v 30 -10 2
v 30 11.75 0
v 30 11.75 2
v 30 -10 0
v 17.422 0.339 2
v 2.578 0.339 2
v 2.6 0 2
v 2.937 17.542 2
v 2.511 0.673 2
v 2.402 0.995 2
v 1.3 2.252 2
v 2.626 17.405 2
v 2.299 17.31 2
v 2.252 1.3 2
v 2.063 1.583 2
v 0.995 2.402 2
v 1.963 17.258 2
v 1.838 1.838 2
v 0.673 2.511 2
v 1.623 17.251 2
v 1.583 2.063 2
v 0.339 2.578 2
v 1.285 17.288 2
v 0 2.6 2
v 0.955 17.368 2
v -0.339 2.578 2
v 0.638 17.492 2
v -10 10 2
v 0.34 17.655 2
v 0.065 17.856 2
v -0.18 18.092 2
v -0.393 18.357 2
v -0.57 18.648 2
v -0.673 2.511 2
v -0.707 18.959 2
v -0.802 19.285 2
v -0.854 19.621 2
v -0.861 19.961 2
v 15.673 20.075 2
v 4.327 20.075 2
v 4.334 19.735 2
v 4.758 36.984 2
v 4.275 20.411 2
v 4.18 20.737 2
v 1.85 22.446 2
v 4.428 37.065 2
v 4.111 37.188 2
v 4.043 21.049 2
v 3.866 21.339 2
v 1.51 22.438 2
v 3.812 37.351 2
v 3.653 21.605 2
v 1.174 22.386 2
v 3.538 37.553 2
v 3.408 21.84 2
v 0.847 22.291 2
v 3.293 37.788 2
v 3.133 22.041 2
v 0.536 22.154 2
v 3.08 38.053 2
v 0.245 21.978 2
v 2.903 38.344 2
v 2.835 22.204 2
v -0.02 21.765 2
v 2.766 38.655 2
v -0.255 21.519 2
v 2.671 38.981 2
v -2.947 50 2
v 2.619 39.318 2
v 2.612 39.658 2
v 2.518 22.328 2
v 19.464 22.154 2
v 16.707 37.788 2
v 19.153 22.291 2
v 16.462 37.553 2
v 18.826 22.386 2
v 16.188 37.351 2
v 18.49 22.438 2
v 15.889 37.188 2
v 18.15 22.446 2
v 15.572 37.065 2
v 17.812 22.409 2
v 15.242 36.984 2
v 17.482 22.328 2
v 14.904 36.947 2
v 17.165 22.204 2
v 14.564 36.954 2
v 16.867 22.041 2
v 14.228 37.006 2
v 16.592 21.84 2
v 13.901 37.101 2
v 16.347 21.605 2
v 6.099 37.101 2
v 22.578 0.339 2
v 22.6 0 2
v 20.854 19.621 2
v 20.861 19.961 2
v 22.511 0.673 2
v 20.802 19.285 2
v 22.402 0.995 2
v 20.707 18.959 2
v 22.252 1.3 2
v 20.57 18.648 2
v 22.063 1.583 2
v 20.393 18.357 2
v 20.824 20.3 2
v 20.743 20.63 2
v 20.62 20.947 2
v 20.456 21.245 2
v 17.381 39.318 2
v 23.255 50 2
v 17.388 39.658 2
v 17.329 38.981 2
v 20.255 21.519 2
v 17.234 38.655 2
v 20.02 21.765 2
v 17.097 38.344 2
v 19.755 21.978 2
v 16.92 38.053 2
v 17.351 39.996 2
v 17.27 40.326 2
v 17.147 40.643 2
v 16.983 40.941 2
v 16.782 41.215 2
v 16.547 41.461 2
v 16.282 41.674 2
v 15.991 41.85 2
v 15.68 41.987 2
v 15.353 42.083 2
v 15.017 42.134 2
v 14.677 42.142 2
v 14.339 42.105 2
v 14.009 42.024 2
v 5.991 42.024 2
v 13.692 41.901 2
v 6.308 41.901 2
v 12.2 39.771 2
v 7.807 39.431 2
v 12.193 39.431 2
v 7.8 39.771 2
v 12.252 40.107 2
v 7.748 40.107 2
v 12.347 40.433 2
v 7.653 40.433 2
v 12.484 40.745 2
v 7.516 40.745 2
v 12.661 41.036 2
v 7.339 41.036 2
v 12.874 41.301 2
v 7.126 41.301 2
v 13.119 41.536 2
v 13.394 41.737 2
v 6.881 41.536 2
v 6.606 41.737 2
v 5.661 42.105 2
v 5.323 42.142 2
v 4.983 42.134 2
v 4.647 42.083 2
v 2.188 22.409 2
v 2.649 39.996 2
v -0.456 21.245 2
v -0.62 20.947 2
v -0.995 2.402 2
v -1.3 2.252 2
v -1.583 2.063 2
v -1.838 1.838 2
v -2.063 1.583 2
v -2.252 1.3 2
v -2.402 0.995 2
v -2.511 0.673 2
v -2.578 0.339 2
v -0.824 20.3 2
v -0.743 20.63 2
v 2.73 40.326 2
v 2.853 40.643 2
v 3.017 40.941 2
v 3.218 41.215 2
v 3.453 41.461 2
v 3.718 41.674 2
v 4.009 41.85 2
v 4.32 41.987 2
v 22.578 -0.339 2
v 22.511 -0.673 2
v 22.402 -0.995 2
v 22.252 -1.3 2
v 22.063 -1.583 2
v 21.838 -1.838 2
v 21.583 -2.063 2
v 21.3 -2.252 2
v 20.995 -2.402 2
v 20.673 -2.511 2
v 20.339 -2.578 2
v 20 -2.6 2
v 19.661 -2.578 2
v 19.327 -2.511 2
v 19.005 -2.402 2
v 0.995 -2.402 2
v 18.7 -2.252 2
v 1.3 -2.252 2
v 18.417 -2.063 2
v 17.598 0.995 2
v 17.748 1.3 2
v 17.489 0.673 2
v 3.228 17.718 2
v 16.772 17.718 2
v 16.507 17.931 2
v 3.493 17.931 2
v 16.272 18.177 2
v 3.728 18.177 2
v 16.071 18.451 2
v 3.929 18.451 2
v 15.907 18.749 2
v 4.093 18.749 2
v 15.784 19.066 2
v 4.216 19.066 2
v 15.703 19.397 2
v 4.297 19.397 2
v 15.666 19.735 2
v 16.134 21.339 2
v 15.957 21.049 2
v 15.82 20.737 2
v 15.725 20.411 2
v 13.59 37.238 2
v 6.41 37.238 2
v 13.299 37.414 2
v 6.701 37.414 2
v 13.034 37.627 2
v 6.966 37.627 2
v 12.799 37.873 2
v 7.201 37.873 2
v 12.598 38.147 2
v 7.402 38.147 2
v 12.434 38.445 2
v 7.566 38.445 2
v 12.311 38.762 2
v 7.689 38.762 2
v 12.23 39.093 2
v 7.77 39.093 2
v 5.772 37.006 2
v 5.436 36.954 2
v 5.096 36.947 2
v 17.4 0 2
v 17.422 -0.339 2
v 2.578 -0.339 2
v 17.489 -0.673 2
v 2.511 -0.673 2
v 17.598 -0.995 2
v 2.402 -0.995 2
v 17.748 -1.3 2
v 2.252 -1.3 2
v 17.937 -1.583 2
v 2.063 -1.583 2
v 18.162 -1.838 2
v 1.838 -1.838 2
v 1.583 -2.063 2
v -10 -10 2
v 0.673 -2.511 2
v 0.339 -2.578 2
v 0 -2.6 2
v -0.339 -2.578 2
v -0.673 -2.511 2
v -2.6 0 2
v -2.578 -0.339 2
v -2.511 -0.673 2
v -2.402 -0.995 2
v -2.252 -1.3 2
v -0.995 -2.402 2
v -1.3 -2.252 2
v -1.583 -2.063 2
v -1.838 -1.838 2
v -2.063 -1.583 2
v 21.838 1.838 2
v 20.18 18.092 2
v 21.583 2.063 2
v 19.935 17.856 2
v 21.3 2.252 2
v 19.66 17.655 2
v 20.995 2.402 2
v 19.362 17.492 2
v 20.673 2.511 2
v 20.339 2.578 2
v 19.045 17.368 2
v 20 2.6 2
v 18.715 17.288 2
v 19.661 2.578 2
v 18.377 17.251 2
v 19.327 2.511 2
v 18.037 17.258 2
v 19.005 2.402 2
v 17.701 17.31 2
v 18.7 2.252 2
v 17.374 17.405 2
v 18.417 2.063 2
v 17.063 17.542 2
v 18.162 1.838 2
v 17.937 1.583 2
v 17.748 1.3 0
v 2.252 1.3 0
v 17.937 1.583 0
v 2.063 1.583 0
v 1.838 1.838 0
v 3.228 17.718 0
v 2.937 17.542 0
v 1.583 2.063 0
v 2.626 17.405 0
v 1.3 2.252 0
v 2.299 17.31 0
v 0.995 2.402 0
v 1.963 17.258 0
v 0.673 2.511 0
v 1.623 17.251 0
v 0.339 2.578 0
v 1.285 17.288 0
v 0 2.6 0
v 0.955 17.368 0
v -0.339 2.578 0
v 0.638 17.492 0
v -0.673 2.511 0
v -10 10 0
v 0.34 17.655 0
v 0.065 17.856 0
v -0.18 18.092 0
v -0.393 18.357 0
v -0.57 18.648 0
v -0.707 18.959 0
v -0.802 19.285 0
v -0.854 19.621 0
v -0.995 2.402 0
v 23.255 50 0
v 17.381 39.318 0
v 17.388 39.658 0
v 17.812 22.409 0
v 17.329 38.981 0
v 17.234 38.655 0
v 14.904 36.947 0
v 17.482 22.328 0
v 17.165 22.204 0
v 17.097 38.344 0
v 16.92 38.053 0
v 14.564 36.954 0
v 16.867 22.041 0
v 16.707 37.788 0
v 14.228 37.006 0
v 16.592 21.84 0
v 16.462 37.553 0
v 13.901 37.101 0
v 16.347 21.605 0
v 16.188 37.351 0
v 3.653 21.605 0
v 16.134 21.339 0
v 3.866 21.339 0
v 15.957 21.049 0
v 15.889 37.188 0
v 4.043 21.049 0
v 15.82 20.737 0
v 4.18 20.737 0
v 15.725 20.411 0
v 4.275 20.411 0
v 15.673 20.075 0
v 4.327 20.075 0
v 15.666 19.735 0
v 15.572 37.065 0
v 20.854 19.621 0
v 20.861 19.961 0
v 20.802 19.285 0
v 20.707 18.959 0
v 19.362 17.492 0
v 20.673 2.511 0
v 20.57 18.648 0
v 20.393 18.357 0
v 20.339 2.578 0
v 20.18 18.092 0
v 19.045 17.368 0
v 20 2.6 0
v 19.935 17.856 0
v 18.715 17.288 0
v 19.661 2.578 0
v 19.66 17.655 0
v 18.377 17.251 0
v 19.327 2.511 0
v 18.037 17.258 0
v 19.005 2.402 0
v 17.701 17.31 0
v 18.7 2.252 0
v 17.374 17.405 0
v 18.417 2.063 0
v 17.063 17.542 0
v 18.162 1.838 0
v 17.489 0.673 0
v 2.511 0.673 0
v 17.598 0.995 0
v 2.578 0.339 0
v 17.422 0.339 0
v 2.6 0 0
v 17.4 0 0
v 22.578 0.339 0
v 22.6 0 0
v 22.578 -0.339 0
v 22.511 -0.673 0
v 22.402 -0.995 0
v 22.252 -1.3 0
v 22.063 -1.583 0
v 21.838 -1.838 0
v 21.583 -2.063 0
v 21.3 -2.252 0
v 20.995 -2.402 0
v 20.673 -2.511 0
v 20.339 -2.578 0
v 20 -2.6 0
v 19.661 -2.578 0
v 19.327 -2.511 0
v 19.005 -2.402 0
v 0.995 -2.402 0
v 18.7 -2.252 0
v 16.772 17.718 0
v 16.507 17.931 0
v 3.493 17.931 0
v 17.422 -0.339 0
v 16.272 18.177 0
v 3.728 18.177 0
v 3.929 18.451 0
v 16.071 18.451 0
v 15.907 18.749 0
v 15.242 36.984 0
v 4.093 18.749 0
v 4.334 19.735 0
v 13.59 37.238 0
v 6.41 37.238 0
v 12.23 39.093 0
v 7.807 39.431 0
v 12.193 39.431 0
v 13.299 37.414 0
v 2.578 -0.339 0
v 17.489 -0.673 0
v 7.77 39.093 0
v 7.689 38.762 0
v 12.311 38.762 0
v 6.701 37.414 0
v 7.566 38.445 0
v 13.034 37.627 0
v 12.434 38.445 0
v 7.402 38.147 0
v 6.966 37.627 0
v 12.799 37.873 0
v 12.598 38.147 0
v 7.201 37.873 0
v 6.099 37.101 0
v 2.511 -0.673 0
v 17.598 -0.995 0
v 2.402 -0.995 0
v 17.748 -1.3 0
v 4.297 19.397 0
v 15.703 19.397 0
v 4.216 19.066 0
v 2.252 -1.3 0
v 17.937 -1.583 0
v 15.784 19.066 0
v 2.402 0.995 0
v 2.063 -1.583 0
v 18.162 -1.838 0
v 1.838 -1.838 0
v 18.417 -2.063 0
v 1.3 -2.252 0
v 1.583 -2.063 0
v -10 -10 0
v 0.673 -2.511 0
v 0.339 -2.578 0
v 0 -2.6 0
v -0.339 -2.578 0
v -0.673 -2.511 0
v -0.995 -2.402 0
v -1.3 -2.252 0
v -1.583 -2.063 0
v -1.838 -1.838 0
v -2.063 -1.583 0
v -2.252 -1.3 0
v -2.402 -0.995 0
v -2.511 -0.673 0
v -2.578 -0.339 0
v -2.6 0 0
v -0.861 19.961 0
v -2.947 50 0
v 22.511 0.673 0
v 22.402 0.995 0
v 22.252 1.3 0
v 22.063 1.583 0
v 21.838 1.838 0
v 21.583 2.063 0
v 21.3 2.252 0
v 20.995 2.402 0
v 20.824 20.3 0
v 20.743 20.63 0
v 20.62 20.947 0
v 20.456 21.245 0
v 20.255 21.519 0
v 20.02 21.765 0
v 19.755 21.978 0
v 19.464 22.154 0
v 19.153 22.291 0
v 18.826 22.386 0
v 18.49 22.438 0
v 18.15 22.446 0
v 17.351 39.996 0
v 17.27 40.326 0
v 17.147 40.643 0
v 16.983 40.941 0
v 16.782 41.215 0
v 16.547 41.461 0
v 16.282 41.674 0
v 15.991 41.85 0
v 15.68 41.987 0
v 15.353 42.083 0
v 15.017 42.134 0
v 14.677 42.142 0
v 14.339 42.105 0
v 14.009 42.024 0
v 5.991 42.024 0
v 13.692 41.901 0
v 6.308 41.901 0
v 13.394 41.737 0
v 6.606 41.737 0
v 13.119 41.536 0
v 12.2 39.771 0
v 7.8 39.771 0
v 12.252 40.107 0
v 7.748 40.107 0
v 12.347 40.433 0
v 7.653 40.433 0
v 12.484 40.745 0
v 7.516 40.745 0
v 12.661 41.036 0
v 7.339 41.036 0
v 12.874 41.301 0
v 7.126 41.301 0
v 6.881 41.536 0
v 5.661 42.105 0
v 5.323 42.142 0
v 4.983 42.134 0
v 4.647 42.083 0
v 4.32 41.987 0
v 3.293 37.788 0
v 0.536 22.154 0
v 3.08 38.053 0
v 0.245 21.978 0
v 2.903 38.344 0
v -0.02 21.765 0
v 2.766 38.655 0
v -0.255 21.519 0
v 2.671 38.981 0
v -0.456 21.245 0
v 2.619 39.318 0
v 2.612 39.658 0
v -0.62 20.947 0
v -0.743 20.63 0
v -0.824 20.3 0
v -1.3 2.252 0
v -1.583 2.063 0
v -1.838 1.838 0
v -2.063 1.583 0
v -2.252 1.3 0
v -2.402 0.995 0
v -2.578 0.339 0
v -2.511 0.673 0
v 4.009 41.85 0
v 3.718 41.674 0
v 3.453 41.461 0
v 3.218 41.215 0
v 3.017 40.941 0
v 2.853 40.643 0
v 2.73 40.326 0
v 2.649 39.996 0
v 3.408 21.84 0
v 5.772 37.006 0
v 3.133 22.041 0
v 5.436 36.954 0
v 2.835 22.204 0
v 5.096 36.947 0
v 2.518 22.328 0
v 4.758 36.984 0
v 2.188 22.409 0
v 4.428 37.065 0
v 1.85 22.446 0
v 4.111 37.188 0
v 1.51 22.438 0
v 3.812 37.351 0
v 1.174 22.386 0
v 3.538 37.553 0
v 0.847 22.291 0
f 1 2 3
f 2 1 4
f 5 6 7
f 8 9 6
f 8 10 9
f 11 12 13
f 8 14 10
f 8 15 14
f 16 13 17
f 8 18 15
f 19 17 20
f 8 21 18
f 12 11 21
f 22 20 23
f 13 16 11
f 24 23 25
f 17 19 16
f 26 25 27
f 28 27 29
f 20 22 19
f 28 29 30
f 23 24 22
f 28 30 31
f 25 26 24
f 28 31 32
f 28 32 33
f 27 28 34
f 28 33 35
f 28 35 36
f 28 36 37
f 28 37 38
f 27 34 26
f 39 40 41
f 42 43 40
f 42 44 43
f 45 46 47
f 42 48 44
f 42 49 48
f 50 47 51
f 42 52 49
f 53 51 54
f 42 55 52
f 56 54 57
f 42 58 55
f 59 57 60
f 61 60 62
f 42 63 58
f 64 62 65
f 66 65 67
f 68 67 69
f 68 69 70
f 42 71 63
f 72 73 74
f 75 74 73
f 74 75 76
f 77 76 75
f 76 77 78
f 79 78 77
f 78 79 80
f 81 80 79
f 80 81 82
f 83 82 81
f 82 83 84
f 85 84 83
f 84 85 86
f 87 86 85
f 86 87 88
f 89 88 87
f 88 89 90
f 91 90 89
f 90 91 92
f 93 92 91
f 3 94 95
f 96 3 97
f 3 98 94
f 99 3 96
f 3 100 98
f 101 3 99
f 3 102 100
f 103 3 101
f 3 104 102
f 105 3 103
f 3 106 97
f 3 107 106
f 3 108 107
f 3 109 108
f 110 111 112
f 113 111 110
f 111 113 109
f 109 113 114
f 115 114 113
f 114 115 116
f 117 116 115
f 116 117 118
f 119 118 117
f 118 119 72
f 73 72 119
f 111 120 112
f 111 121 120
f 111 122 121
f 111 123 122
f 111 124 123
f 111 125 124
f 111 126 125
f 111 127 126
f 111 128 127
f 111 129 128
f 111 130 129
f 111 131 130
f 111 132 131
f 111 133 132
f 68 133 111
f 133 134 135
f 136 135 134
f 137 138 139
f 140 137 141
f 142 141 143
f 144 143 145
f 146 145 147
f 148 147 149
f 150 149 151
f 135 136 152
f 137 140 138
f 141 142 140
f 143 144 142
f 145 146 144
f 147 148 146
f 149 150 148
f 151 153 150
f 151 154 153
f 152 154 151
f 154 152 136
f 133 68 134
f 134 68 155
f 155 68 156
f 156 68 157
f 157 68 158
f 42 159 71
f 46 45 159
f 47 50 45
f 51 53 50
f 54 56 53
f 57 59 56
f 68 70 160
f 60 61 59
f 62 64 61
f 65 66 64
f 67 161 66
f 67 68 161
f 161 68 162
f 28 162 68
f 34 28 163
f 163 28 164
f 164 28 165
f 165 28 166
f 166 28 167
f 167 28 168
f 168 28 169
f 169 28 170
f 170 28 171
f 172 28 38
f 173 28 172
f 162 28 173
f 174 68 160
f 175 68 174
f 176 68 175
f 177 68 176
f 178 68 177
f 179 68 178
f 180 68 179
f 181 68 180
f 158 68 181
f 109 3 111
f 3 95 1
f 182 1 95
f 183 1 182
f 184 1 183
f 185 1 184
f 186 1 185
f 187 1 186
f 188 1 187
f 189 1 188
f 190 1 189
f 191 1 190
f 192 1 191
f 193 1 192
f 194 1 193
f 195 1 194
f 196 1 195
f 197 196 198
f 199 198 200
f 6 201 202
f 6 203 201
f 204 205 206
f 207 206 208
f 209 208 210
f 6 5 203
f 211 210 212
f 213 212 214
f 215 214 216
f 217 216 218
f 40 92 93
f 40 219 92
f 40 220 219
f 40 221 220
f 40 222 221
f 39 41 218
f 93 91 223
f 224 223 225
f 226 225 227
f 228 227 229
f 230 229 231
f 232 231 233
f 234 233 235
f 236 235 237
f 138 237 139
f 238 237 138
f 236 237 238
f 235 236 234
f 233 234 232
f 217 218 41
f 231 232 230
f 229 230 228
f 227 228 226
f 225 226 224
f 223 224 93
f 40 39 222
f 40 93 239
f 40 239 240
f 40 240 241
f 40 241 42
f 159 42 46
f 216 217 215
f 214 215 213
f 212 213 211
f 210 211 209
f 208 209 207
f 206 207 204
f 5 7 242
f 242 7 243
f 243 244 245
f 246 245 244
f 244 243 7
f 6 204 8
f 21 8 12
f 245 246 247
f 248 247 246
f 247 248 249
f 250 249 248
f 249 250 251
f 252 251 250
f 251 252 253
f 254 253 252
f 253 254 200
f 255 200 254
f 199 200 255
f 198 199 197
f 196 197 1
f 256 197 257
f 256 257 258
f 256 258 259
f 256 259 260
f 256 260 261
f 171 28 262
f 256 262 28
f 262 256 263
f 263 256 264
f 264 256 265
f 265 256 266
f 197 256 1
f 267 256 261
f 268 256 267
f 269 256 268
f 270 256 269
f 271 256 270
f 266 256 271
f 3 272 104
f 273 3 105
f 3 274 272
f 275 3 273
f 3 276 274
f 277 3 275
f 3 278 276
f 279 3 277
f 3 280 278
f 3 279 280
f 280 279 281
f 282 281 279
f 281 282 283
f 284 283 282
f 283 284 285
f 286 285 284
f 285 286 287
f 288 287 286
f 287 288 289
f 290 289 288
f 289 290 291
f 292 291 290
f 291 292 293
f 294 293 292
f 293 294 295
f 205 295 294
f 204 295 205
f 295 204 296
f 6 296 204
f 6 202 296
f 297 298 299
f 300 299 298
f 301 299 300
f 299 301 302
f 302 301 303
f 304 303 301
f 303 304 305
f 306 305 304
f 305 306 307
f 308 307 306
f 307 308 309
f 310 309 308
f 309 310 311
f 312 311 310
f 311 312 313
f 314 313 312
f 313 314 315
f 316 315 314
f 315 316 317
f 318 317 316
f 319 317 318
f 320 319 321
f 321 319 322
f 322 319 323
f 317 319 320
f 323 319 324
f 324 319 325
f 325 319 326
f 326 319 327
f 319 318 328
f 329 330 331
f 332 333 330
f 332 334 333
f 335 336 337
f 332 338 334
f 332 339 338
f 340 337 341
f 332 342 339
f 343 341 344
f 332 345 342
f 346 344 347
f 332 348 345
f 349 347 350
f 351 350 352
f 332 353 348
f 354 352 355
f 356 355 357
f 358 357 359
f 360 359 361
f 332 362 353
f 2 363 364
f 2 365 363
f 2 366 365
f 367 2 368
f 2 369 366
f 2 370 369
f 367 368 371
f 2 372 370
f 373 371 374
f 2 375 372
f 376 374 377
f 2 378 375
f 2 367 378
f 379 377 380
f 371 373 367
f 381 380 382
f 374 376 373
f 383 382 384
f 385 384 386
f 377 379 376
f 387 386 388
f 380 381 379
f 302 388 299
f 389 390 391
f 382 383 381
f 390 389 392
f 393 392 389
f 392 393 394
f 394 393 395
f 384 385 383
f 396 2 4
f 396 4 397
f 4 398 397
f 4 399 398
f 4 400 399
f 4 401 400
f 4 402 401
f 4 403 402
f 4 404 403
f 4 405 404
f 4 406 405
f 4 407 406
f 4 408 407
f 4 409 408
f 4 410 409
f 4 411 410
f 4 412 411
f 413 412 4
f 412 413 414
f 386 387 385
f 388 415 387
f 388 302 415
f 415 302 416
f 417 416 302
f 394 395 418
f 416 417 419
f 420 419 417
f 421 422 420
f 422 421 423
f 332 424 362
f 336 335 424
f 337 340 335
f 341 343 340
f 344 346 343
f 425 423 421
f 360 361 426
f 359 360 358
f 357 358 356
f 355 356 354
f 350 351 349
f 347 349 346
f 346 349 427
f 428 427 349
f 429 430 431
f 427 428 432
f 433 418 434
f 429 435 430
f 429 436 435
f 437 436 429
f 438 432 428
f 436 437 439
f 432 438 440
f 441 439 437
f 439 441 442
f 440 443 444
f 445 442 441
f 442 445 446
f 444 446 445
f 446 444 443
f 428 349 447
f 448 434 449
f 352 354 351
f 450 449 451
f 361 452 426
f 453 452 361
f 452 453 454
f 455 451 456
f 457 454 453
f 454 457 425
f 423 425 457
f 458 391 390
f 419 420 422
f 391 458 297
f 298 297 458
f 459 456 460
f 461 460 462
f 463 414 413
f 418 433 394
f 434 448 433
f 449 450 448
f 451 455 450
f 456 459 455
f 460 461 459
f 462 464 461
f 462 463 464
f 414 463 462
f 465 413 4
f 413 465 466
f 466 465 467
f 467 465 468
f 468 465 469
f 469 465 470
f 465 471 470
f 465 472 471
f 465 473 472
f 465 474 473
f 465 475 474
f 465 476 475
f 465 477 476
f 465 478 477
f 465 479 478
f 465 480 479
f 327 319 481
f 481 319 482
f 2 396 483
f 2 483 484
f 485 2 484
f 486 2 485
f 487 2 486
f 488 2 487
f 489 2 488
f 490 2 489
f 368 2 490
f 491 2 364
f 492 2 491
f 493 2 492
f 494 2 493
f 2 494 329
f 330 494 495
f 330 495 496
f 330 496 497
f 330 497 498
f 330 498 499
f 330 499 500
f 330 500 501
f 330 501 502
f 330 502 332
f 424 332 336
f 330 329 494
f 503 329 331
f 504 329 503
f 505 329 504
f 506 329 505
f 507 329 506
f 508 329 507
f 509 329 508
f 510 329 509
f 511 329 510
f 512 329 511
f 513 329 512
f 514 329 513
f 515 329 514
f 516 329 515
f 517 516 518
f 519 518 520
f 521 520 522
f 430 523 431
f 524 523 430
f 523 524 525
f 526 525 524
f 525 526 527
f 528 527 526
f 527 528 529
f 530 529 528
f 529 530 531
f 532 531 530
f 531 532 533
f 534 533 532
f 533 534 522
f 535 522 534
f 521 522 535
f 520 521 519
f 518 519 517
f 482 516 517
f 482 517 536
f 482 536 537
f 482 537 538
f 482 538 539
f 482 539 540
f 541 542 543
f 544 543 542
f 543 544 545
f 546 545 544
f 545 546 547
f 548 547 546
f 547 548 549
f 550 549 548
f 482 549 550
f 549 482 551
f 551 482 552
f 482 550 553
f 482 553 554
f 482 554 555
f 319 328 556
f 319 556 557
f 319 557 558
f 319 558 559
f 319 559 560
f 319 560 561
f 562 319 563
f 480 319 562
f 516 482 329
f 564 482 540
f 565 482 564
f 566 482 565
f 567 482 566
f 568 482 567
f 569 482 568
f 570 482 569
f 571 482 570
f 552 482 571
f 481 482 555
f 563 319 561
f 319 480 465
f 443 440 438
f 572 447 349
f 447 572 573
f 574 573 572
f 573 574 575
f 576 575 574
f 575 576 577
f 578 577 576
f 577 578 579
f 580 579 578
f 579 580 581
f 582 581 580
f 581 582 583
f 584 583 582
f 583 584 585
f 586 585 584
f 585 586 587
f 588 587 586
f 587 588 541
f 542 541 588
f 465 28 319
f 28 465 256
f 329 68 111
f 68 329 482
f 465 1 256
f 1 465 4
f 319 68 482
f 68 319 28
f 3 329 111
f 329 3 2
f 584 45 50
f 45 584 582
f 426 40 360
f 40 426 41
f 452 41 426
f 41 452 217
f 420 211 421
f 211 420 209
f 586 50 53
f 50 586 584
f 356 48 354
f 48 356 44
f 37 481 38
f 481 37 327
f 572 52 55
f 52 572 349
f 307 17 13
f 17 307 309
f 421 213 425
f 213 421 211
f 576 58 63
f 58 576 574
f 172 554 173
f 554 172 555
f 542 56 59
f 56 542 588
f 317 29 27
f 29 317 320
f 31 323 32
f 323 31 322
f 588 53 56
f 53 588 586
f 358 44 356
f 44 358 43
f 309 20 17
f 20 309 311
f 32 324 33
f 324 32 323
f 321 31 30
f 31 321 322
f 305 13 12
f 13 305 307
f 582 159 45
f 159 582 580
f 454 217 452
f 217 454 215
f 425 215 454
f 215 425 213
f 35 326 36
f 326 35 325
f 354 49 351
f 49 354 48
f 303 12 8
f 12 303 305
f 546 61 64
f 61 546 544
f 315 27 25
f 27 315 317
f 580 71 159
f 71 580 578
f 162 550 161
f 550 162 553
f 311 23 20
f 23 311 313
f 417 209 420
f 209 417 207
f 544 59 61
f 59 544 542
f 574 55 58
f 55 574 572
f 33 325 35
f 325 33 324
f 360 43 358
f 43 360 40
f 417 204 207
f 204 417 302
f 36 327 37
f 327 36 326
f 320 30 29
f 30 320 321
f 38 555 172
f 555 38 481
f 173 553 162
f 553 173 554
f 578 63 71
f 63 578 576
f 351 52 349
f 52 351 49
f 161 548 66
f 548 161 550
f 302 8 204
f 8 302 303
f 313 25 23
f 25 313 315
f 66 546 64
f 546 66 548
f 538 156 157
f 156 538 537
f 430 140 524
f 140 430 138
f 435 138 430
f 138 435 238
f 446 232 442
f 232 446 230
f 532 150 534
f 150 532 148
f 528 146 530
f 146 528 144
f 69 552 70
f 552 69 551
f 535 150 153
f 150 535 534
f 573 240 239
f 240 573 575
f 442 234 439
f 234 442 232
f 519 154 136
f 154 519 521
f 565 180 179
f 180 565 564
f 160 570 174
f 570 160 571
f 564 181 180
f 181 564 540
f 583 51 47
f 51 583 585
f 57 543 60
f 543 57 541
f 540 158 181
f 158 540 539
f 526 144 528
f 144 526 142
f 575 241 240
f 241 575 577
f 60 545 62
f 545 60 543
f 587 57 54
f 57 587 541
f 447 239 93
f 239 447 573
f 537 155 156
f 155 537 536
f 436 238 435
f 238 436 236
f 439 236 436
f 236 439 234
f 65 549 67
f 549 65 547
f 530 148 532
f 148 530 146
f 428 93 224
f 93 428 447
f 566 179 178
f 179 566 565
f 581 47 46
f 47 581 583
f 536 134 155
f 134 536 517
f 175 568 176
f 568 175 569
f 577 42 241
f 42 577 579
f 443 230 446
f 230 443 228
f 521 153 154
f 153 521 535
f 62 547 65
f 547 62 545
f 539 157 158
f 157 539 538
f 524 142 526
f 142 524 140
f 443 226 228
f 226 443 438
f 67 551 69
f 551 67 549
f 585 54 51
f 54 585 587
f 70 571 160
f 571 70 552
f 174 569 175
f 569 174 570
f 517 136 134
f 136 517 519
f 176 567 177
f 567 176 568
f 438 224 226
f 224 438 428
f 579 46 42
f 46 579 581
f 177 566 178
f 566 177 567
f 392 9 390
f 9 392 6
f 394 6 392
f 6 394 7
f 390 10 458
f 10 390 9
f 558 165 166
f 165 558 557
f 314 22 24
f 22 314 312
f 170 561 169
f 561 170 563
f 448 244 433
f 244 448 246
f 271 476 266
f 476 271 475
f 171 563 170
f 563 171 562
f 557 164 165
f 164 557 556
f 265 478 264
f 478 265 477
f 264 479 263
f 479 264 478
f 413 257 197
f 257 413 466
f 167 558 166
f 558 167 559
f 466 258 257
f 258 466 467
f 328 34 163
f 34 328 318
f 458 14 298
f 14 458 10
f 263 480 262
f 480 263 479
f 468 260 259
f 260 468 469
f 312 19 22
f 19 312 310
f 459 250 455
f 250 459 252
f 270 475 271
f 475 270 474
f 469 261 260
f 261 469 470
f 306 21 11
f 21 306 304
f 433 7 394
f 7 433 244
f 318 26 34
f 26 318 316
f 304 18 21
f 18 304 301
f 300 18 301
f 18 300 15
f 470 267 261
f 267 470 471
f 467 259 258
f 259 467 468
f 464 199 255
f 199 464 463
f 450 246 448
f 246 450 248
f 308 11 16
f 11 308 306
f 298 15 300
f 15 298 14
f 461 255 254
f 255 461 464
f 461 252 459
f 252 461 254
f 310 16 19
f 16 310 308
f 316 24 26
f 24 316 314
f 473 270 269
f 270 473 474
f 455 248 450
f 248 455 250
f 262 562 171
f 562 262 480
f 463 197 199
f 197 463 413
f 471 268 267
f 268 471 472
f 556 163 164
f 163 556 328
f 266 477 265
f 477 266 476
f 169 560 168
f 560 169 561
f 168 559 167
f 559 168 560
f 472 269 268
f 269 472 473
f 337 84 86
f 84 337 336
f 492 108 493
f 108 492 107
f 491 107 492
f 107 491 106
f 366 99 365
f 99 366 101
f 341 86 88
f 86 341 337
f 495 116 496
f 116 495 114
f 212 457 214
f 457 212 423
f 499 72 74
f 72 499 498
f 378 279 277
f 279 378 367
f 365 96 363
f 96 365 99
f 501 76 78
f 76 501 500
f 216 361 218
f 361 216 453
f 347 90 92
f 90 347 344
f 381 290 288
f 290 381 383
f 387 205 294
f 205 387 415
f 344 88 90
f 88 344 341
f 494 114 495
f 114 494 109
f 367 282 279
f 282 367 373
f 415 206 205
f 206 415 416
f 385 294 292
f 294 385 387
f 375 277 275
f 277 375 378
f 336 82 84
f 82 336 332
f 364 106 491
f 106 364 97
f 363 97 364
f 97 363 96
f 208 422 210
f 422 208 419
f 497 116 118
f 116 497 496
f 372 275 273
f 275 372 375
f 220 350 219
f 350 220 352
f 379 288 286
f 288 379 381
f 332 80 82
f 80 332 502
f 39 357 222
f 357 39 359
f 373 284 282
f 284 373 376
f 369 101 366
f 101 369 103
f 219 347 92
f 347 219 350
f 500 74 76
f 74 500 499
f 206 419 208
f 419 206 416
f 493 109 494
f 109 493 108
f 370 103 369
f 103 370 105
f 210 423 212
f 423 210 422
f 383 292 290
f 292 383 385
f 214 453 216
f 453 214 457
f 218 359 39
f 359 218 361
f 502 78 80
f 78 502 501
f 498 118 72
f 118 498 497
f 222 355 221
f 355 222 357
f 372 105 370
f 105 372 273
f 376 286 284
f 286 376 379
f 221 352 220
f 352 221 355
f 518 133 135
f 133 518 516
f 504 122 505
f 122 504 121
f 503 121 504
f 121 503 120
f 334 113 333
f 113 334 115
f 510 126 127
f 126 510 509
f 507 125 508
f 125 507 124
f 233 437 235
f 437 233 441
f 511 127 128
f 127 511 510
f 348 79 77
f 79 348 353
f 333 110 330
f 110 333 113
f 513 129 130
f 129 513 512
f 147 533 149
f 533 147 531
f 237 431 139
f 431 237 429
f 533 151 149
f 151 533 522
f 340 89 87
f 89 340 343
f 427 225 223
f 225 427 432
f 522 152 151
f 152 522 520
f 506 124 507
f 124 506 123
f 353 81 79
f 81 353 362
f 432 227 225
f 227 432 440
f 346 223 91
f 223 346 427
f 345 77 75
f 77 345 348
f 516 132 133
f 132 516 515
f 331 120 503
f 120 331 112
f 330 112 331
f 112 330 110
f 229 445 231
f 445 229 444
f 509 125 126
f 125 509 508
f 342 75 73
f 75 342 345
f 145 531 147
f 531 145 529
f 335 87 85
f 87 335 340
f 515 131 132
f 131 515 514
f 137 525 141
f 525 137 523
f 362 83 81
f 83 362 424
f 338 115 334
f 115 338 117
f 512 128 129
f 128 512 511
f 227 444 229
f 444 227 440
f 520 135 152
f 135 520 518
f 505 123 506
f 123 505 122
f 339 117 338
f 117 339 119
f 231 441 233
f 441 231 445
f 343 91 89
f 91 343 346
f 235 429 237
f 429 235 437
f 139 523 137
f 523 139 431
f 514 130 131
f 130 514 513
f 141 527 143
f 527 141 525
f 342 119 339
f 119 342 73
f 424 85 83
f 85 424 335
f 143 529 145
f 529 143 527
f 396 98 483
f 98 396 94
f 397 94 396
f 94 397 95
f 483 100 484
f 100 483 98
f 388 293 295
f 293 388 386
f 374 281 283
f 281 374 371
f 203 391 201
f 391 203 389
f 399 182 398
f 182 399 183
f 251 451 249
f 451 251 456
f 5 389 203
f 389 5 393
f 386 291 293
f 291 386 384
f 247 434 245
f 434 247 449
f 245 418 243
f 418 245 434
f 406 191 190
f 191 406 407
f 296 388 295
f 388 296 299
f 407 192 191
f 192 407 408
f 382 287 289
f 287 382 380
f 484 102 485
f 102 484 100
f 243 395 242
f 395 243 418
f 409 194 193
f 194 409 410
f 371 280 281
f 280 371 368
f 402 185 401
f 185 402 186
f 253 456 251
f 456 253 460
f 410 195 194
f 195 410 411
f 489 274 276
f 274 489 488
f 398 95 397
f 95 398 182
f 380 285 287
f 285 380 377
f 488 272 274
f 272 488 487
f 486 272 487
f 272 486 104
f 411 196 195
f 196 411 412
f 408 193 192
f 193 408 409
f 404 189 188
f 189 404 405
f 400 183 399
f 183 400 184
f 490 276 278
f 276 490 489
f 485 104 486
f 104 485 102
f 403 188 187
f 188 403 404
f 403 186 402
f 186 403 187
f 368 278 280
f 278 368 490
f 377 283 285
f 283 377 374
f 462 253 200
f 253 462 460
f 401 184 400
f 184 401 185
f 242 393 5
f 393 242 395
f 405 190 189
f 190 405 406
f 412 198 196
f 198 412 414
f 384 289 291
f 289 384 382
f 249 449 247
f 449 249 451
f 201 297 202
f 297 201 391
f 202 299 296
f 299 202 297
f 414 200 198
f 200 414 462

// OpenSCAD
t2020_w = 20;
t2020_notch_w = 6;
t2020_notch_d = 6;
t2020_hole_ir = 5/2;

module t2020(length=100) {
    translate([0, 0, -length/2])
    linear_extrude(length) {
        difference() {
            square([t2020_w, t2020_w], center=true);
            for (i=[0:3]) {
                rotate([0, 0, 90 * i]) {
                    translate([t2020_w/2 - t2020_notch_d / 2, 0, 0]) {
                        square([t2020_notch_d, t2020_notch_w], center=true);
                    }
                }
            }
            circle(r=t2020_hole_ir);
        }
    }
}

module t2020_hole(length) {
    t2020(length);
    cube([t2020_w - 2, t2020_w - 2, length+1], center=true);
}

bracket_h = 2;
bracket_or = 50;
bracket_hole_or = 5.2/2;
bot_side = 300;

module corner_bracket(vert_slot=true) {
	// % for (r=[30, -30, -90])
	// 	translate([0, 0, bracket_h+10])
	// 	rotate([-90, 0, r])
	// 	translate([0, 0, bot_side/2])
	// 	t2020(bot_side);
	// % rotate([0, 0, -30])
	// 	translate([0, 6, bot_side/2])
	// 	t2020(bot_side);
	difference() {
		intersection() {
			cylinder(h=bracket_h, r=bracket_or, $fn=6);
			union() {
				translate([0, -10, 0])
					cube([bracket_or + 10, bracket_or + 10, bracket_h]);
				rotate([0, 0, 30])
					translate([-10, 0, 0])
					cube([bracket_or + 10, bracket_or + 10, bracket_h]);
				cylinder(r=10, h=bracket_h);
			}
		}
		for (r=[0, 60, 120]) {
			for (dx=[10, 20, 30, 50]) {
				rotate([0, 0, r])
				translate([bracket_or - dx, 0, 0])
				cylinder(r=bracket_hole_or, h=bracket_h, $fn=48);
			}
		}
		if (vert_slot) {
			rotate([0, 0, -30])
				translate([0, 2, 0])
				cube([20, 28, bracket_h*2+1], center=true);
		}
	}
	
}

module bottom_bracket() {
	corner_bracket(false);
}
// ! bottom_bracket();
// !corner_bracket();


center_or = 65;

module center_bracket() {
	difference() {
		cylinder(r=center_or, h=bracket_h, $fn=6);
		for (r=[0:60:360]) {
			for (dx=[10, 30]) {
				rotate([0, 0, r])
					translate([center_or - dx, 0, -1])
					cylinder(r=bracket_hole_or, h=bracket_h+2, $fn=48);
			}
		}
		rotate([0, 0, 30])
			cylinder(r=20, h=bracket_h+2, $fn=6);
	}
}
// ! center_bracket();

femur_angle = 80;

module femur_base_bracket() {
	difference() {
		translate([-10, -10, 0]) {
		
			intersection() {
				cube([40, 60, bracket_h]);
				translate([0, 20, 0])
					rotate([0, 0, femur_angle-90])
					translate([0, -20, 0])
					cube([50, 90, bracket_h]);
				translate([20, 20, 0])
					rotate([0, 0, 90-femur_angle])
					translate([-40, -30, 0])
					cube([60, 90, bracket_h]);
				* translate([40, 20, 0])
					rotate([0, 0, 15])
					translate([-40, 0, 0])
					cube([40, 70, bracket_h]);
				// cylinder(r=60, h=bracket_h);
			}
		}
		for (i=[-1, 1]) {
			translate([10 + i * 10, 0, 0]) {
				cylinder(r=bracket_hole_or, h=bracket_h, $fn=48);
				translate([0, 10, 0])
					rotate([0, 0, i*(90-femur_angle)]) 
					{
					for (y=[10:20:40])
						translate([0, y, 0])
							cylinder(r=bracket_hole_or, h=bracket_h, $fn=48);
				}
			}
		}
	}
	% translate([-10, 10, 0])
		rotate([0, 0, femur_angle-90])
		translate([10, 60, bracket_h+10])
		rotate([90, 0, 0])
		t2020(120);
	% //rotate([0, 0, femur_angle-90])
		translate([50, 0, bracket_h+10])
		rotate([90, 0, 90])
		t2020(120);

}

femur_base_bracket();

actuator_motor_h = 98;
actuator_motor_or = 15;
actuator_lower_or = 15;
actuator_lower_h = 350;  // TODO: measure
actuator_bracket_w = 15;
actuator_hole_ir = 3;
actuator_upper_or = 10;
actuator_min_c_c = 370;
actuator_max_c_c = 620;
actuator_stroke = actuator_max_c_c - actuator_min_c_c;

module actuator(pos=0) {
	difference() {
		cube([actuator_bracket_w, actuator_bracket_w, actuator_bracket_w], center=true);
		cylinder(r=actuator_hole_ir, h=actuator_bracket_w, center=true);
	}
	translate([actuator_bracket_w/2, 0, 0])
		rotate([0, 90, 0])
		cylinder(r=actuator_lower_or, h=actuator_lower_h);
	translate([actuator_bracket_w/2, actuator_lower_or + actuator_motor_or, 0])
		rotate([0, 90, 0])
		cylinder(r=actuator_lower_or, h=actuator_motor_h);
	# translate([actuator_min_c_c + pos - actuator_stroke - 3*actuator_bracket_w/2, 0, 0])
		rotate([0, 90, 0])
		cylinder(r=actuator_upper_or, h=actuator_stroke + actuator_bracket_w);
	translate([actuator_min_c_c + pos, 0, 0])
		difference() {
			cube([actuator_bracket_w, actuator_bracket_w, actuator_bracket_w], center=true);
			cylinder(r=actuator_hole_ir, h=actuator_bracket_w, center=true);
		}
	
}


FRAME_U = 300;
FRAME_DIAM = 635;

module hex_edge() {
	// FRAME_U beam cut at 30 deg
	difference() {
		t2020(FRAME_U);
		for (i=[-1, 1])
			translate([-t2020_w/2, -t2020_w/2, i*FRAME_U/2])
			rotate([-45 + i * 15, 0, 0])
			cube(2*[t2020_w, t2020_w, t2020_w]);
	}
}

// ! hex_edge();

module frame_layer() {
	for (i=[-1, 1]) {
		translate([0, 0, -bracket_h/2 + i * (bracket_h/2 + t2020_w/2)])
			center_bracket();	
	}
	rotate([0, 90, 0])
		t2020(FRAME_DIAM);
	for (r=[0:60:360]) {
		rotate([0, 0, r]) {
			translate([FRAME_DIAM/2 - FRAME_U/2, 0, 0])
				rotate([0, 90, 0])
				t2020(FRAME_U);
			translate([FRAME_DIAM/2, t2020_w/2, 0])
				rotate([0, 90, 120])
				translate([0, t2020_w/2, FRAME_U/2])
				hex_edge();
			translate([FRAME_DIAM/2 - t2020_w/3, 0, -t2020_w/2 - bracket_h])
				rotate([0, 0, 120])
				bottom_bracket();
			translate([FRAME_DIAM/2 - t2020_w/3, 0, t2020_w/2])
				rotate([0, 0, 120])
				corner_bracket();
		}
	}
}

module frame() {
	frame_layer();
	
	
}

// frame();

module spacer(id=5.1, od=7.9, h=15, clr=1) {
	difference() {
		union() {
			cylinder(r=od/2, h=h, $fn=48);
			translate([0, 0, h])
				sphere(r=od/2, $fn=48);
		}
		cylinder(r=id/2, h=3*h+1, $fn=48, center=true);
		translate([od/2, 0, 0])
			cube([od, clr, 3*h+1], center=true);
	}
}
// !spacer();


uj_clearance = 1;
uj_ir = actuator_bracket_w * 1.5 / 2;

module universal_joint() {
	difference() {
		rotate([0, 90, 0])
			cylinder(r=actuator_bracket_w, h=actuator_bracket_w*2/3, center=true);
		cube([2*uj_ir, 2*uj_ir, actuator_bracket_w - 2*uj_clearance], center=true);
		# cylinder(r=actuator_hole_ir, h=actuator_bracket_w*2, center=true);
		# for (i=[-1, 1])
			translate([0, i*uj_ir, 0])
			rotate([-i*90, 0, 0]) {
				cylinder(r=1.5*actuator_hole_ir, h=actuator_hole_ir);
				cylinder(r=actuator_hole_ir, h=actuator_bracket_w);
			}
	}
	// % actuator();

}

// ! universal_joint();

// leg_base_offs = 100;
// leg_foot_offs = 20;
// leg_foot_or = leg_foot_offs + actuator_bracket_w;

// module leg_foot() {
// 	difference() {
// 		sphere(r=leg_foot_or);
// 		translate([0, 0, -leg_foot_or/2])
// 			cube([2*leg_foot_or, 2*leg_foot_or, leg_foot_or], center=true);
// 		for (i=[0:120:360])
// 			rotate([0, 0, i])
// 			translate([0, leg_foot_offs, 0])
// 			rotate([0, -90, 90]) {
// 				universal_joint();
// 			}
// 	}
// }

// function point_distance(p1, p2) = sqrt(
// 	(p2[0] - p1[0])^2 +
// 	(p2[1] - p1[1])^2 +
// 	(p2[2] - p1[2])^2);

// function point_diff(p1, p2) = [
// 	p2[0] - p1[0],
// 	p2[1] - p1[1],
// 	p2[2] - p1[2]];

// // rotation from p1 to p2
// function rot_difference(p1, p2) = [
// 	atan2(point_diff(p1, p2)[1], point_diff(p1, p2)[2]),
// 	atan2(point_diff(p1, p2)[0], point_diff(p1, p2)[2]),
// 	0,
// ];

// function rotate_point(p, rotation) = [
// 	/*
// 		rotate point p about the z axis.
// 		first convert (x, y) projection to polar,
// 		rotate polar,
// 		and reproject to (x', y')
// 	*/
// 	// r = point_distance([p[0], p[1], 0], [0, 0, 0])
// 	// theta = atan2(p[1], p[0])
// 	// p'[0] = r * sin(theta + rotation)
// 	// p'[1] = r * cos(theta + rotation)
// 	point_distance(
// 		[0, 0, 0], [p[0], p[1], 0]
// 		) * cos(atan2(p[1], p[0]) + rotation),
// 	point_distance(
// 		[0, 0, 0], [p[0], p[1], 0]
// 		) * sin(atan2(p[1], p[0]) + rotation),
// 	p[2]
// ];

// test_rot = 120;
// test_point = [0, leg_base_offs, 0];
// echo("rotate point(", test_point, ", ", test_rot, ") = ", rotate_point(test_point, test_rot));

// module leg_actuator(x=0, y=0, z=400, rotation=0) {
// 	l0_startpoint = rotate_point(
// 		[0, leg_base_offs, 0], rotation);
// 	l0_endpoint = [x, y, z] + rotate_point(
// 		[0, leg_foot_offs, 0], rotation);
// 	l0_rot = rot_difference(l0_startpoint, l0_endpoint);
// 	l0_ext = point_distance(l0_startpoint, l0_endpoint) - actuator_min_c_c;
// 	echo(
// 		l0_startpoint, 
// 		l0_endpoint, 
// 		actuator_min_c_c, 
// 		l0_ext, 
// 		l0_rot, 
// 		point_diff(l0_startpoint, l0_endpoint));
// 	rotate([0, 0, rotation])
// 		translate([0, leg_base_offs, 0]) {
// 			rotate(l0_rot) 
// 			rotate([0, -90, 0])
// 				# actuator(l0_ext);
// 			rotate([0, -90, 0])
// 				universal_joint();
// 		}
// }

// module leg(x=0, y=0, z=400) {
// 	for (rot=[0:120:180]) {
// 		leg_actuator(x, y, z, rot);
// 	}
	
// 	// rotate([0, 0, 360/3])
// 	// 	translate([0, leg_base_offs, 0])
// 	// 	rotate([0, 90, 0])
// 	// 	actuator(y);
// 	// rotate([0, 0, 2*360/3])
// 	// 	translate([0, leg_base_offs, 0])
// 	// 	rotate([0, 90, 0])
// 	// 	actuator(z);
// 	translate([x, y, z])
// 		leg_foot();
// }

// leg();
